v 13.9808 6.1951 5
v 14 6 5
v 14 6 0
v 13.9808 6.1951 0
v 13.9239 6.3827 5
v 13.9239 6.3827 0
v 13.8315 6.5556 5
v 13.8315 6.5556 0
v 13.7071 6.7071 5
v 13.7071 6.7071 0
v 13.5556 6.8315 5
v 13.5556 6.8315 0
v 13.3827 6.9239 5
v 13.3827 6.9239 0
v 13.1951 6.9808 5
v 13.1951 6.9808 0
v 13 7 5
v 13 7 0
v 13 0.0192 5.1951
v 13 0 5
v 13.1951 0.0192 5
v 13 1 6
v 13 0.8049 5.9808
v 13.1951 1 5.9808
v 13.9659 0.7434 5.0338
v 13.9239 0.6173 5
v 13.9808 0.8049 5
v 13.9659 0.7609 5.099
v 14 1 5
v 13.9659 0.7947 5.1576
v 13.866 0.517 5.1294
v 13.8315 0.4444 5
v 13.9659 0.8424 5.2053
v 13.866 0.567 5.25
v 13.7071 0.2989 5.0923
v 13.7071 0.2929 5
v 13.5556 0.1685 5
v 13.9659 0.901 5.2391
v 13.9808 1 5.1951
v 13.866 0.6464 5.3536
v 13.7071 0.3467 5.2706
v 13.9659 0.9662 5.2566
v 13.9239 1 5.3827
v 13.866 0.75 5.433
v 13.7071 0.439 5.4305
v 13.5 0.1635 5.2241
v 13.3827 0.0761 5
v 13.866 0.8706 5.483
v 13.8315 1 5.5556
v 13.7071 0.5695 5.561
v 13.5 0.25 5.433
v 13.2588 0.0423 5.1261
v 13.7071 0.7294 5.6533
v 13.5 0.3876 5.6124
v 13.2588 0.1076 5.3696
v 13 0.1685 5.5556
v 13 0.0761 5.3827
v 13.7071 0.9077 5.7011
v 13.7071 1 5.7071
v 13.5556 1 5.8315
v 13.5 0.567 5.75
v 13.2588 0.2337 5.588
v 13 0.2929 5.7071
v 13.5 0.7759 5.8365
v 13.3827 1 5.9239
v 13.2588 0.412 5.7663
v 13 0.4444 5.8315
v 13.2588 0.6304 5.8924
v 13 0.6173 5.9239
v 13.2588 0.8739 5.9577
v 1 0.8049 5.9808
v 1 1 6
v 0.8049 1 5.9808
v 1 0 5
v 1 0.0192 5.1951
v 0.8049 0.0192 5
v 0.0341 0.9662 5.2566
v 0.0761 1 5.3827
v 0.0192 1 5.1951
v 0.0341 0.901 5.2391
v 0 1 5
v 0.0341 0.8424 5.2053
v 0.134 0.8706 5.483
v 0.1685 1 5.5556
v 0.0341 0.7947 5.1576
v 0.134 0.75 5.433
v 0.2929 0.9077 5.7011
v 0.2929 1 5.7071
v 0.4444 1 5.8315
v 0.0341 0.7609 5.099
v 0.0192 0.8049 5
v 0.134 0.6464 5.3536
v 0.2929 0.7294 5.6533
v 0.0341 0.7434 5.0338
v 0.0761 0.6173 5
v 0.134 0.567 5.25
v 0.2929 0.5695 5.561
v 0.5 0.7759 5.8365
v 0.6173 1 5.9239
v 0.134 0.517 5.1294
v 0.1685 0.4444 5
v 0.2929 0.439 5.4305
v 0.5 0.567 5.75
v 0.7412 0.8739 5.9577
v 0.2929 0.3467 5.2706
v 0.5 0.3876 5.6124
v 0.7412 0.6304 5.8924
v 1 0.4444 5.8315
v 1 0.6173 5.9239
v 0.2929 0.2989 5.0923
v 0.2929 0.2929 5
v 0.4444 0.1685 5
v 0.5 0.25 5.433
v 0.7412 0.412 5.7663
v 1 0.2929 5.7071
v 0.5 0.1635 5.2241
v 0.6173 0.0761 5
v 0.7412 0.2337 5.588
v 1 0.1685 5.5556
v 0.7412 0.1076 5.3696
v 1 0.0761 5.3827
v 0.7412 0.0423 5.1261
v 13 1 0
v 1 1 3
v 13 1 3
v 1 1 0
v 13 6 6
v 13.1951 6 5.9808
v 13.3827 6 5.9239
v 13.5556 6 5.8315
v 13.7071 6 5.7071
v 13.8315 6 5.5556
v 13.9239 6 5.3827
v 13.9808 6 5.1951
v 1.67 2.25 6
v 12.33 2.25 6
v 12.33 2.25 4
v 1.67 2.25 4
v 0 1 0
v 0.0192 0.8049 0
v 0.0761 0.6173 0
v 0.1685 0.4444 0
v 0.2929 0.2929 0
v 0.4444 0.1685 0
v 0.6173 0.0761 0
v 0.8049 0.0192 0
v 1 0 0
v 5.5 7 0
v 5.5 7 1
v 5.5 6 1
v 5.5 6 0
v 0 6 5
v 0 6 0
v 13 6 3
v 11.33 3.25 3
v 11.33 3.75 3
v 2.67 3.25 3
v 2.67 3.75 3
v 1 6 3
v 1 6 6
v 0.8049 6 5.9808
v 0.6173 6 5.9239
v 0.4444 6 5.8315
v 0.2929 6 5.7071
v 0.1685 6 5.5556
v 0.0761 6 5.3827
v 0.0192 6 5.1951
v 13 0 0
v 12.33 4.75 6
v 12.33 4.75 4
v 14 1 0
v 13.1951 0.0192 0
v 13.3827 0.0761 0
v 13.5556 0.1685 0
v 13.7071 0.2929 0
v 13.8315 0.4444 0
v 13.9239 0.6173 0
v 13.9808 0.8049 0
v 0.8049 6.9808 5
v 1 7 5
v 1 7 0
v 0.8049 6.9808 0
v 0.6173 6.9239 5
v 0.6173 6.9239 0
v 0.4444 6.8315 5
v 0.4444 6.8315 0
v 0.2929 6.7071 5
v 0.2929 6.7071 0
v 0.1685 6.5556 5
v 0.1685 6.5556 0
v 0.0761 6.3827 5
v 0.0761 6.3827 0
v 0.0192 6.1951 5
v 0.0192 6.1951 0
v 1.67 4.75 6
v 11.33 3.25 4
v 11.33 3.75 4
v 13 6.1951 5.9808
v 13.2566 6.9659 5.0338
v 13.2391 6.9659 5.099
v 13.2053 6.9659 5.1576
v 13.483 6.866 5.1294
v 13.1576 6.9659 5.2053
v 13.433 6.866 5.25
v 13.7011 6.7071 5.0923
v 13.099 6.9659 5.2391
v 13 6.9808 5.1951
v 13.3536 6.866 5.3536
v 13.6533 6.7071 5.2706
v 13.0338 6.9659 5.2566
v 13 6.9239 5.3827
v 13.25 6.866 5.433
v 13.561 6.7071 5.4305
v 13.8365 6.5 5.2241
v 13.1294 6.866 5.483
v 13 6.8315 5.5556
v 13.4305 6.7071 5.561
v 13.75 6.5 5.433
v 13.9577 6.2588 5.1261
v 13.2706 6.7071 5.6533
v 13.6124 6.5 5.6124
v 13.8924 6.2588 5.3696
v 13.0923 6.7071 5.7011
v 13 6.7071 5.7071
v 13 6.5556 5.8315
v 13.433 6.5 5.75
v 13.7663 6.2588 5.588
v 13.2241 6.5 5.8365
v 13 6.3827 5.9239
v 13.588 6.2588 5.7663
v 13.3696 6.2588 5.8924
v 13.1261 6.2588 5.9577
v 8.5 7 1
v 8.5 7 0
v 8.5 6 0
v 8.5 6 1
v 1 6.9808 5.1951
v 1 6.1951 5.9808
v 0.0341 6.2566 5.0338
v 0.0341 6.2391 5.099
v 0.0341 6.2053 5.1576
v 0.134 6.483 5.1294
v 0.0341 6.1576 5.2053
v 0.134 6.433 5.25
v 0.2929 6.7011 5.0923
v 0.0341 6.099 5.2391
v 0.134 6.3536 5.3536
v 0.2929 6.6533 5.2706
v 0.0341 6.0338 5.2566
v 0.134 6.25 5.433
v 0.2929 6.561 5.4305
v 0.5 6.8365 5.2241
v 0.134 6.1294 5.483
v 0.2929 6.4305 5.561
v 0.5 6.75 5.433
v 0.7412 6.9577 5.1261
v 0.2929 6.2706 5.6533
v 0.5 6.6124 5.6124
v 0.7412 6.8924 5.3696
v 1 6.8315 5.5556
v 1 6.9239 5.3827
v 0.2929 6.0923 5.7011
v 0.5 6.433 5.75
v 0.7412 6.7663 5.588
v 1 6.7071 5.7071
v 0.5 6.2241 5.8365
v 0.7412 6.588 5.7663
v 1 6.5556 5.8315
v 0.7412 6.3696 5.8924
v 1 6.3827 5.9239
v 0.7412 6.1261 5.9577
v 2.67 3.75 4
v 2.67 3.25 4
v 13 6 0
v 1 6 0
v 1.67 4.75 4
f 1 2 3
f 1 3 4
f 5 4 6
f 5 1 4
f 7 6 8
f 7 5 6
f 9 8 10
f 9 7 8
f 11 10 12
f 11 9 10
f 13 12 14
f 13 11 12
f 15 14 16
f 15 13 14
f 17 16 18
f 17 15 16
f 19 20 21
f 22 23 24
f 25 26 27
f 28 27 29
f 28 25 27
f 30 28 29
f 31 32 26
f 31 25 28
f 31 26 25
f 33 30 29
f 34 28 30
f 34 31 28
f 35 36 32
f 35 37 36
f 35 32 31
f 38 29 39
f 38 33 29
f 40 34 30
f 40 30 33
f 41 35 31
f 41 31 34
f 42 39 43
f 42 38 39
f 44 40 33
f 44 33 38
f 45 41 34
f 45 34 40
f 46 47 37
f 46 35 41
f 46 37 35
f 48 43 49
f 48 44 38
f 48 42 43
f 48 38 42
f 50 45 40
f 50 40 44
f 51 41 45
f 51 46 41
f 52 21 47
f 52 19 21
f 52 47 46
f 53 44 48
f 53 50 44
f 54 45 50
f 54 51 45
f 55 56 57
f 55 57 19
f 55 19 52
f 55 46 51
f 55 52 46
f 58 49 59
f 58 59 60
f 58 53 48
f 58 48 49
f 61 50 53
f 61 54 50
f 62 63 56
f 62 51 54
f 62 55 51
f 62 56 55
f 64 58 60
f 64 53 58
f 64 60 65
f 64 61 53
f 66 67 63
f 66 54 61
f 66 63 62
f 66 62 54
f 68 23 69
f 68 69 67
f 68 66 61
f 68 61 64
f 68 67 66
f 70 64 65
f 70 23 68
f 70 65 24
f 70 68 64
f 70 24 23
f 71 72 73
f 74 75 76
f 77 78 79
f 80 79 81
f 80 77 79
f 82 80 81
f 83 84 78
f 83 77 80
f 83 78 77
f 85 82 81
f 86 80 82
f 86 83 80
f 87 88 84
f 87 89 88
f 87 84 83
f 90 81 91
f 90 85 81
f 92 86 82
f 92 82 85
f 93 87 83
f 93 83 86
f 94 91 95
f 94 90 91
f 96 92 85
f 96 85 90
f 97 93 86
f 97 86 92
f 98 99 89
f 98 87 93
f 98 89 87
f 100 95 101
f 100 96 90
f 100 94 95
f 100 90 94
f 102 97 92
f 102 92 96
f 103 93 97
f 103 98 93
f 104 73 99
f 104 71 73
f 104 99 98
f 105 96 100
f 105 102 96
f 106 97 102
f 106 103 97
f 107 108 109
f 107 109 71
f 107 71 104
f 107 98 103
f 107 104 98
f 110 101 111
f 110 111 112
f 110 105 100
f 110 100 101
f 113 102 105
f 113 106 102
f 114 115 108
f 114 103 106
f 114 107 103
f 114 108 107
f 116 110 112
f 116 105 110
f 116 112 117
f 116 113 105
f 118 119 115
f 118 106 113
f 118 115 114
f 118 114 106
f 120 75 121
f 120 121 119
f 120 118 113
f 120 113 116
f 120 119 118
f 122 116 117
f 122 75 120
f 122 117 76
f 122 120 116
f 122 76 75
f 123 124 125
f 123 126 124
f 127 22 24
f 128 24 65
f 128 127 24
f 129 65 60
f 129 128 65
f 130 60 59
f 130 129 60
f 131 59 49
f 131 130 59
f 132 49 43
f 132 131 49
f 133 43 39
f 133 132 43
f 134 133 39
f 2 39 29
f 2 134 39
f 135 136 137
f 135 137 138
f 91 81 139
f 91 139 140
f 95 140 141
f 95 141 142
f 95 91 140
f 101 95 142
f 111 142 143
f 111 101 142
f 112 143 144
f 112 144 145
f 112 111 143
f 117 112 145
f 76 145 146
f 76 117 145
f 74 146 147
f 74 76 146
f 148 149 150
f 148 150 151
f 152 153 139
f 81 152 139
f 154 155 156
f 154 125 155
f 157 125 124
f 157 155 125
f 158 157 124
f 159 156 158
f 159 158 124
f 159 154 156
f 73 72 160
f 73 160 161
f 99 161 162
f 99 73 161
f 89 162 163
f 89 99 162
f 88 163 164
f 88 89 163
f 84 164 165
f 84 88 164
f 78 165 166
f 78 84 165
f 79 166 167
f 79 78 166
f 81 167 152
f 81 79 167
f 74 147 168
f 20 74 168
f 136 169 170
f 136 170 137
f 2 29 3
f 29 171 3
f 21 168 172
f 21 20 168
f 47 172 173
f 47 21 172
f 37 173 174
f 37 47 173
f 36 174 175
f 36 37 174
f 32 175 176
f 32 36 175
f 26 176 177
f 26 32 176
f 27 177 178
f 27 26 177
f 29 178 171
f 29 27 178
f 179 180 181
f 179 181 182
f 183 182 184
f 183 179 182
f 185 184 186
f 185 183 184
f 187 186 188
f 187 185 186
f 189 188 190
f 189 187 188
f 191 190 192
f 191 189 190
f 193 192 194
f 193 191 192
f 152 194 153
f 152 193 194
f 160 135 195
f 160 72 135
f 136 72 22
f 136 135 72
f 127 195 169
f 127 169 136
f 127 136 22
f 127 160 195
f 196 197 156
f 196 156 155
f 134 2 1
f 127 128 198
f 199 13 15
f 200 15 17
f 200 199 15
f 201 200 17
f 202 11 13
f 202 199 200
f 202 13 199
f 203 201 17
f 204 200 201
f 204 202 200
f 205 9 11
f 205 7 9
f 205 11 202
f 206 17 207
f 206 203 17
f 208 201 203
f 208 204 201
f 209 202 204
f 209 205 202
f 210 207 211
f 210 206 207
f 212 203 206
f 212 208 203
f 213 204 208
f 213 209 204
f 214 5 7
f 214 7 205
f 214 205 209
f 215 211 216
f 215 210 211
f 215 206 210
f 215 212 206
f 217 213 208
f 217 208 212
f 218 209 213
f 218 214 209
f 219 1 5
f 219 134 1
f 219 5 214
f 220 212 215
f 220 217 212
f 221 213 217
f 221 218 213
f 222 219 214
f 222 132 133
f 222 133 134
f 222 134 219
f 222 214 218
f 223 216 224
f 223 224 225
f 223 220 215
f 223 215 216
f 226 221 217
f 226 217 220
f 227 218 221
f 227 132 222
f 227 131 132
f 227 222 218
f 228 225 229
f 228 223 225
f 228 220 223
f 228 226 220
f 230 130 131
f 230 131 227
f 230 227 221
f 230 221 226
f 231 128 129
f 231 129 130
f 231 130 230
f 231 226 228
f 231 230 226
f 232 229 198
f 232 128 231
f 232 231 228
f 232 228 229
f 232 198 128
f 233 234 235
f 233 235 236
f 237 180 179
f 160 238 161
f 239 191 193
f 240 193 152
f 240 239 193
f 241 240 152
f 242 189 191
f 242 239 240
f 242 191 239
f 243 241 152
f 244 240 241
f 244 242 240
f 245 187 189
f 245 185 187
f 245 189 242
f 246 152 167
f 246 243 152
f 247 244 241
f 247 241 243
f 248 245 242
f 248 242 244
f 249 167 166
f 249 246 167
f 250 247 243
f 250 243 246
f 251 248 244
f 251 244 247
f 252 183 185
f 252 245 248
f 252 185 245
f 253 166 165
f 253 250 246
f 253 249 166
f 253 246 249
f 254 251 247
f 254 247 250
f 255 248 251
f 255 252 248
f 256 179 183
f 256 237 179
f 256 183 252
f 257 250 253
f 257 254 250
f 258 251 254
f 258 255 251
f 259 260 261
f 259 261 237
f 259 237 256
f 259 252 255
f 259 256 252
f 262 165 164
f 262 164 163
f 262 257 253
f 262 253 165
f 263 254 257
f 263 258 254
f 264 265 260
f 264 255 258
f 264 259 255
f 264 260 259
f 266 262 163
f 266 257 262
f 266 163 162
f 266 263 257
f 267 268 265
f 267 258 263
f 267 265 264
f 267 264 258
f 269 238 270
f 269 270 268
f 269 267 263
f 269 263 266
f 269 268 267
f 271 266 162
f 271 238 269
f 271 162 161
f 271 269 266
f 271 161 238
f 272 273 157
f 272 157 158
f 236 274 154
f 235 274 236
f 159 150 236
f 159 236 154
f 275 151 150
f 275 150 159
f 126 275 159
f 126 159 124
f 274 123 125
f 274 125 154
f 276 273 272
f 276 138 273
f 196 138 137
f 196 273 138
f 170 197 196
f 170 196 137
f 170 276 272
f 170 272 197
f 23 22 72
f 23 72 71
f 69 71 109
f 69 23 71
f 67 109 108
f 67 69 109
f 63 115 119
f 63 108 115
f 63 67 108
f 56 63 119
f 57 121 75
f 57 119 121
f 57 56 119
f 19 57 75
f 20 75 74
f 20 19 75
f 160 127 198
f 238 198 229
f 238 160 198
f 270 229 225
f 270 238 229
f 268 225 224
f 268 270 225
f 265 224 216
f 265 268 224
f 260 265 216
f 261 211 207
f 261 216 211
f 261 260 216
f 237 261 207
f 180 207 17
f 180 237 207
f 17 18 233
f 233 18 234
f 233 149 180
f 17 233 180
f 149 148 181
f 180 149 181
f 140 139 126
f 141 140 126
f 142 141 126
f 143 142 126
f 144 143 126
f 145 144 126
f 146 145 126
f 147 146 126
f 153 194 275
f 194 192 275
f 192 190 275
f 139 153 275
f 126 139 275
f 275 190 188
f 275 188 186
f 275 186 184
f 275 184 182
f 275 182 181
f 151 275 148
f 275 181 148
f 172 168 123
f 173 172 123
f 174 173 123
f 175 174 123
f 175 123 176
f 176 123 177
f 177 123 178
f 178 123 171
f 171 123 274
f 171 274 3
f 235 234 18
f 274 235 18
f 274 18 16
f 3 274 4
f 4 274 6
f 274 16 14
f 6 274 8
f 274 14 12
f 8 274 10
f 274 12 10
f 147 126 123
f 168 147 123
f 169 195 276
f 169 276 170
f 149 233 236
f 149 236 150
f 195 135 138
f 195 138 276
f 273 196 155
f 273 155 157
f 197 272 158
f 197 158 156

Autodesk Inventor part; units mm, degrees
ref_plane "YZ Plane" through (0, 0, 0) normal (1, 0, 0) x (0, 1, 0)
ref_plane "XZ Plane" through (0, 0, 0) normal (0, 1, 0) x (-1, 0, 0)
ref_plane "XY Plane" through (0, 0, 0) normal (0, 0, 1) x (1, 0, 0)
sketch "Sketch1" plane through (0, 0, 0) normal (0, 0, 1) x (1, 0, 0)
  line L0 (0, 0) -> (14, 0)
  line L1 (14, 0) -> (14, 7)
  line L2 (14, 7) -> (0, 7)
  line L3 (0, 7) -> (0, 0)
  dimension "d2" = 14
  dimension "d3" = 7
extrude "Extrusion1" add sketch "Sketch1" along normal blind 6
sketch "Sketch2" plane through (0, 0, 6) normal (0, 0, 1) x (1, 0, 0)
  line L0 (0, 7) -> (14, 0) construction
  line L1 (0, 0) -> (14, 7) construction
  line L2 (1.67, 4.75) -> (12.33, 4.75)
  line L3 (12.33, 4.75) -> (12.33, 2.25)
  line L4 (12.33, 2.25) -> (1.67, 2.25)
  line L5 (1.67, 2.25) -> (1.67, 4.75)
  line L6 (1.67, 4.75) -> (12.33, 2.25) construction
  line L7 (12.33, 4.75) -> (1.67, 2.25) construction
  point P0 (7, 3.5)
  dimension "d4" = 2.5
  dimension "d5" = 10.66
extrude "Extrusion3" cut sketch "Sketch2" against normal blind 2
sketch "Sketch3" plane through (0, 0, 4) normal (0, 0, 1) x (1, 0, 0)
  line L0 (1.67, 4.75) -> (12.33, 4.75) projected
  line L1 (1.67, 2.25) -> (1.67, 4.75) projected
  line L2 (12.33, 2.25) -> (1.67, 2.25) projected
  line L3 (12.33, 4.75) -> (12.33, 2.25) projected
  line L4 (2.67, 3.75) -> (11.33, 3.75)
  line L5 (11.33, 3.75) -> (11.33, 3.25)
  line L6 (11.33, 3.25) -> (2.67, 3.25)
  line L7 (2.67, 3.25) -> (2.67, 3.75)
  point P0 (0, 0)
  dimension "d10" = 1
  dimension "d11" = 1
  dimension "d12" = 1
  dimension "d13" = 1
extrude "Extrusion4" cut sketch "Sketch3" against normal blind 4 contours L4 L5 L6 L7
sketch "Sketch4" plane through (0, 0, 0) normal (0, 0, -1) x (-1, 0, 0)
  line L0 (-2.67, 3.75) -> (-2.67, 3.25) projected
  line L1 (-2.67, 3.25) -> (-11.33, 3.25) projected
  line L2 (-11.33, 3.25) -> (-11.33, 3.75) projected
  line L3 (-11.33, 3.75) -> (-2.67, 3.75) projected
  line L4 (0, 0) -> (-14, 0) projected
  line L5 (0, 7) -> (0, 0) projected
  line L6 (-14, 7) -> (0, 7) projected
  line L7 (-14, 0) -> (-14, 7) projected
  line L8 (-13, 6) -> (-1, 6)
  line L9 (-1, 6) -> (-1, 1)
  line L10 (-1, 1) -> (-13, 1)
  line L11 (-13, 1) -> (-13, 6)
  dimension "d16" = 1
  dimension "d17" = 1
  dimension "d18" = 1
  dimension "d19" = 1
extrude "Extrusion5" cut sketch "Sketch4" against normal blind 3 contours L8 L9 L10 L11
sketch "Sketch5" plane through (0, 7, 0) normal (0, 1, 0) x (1, 0, 0)
  line L0 (14, 0) -> (0, 0) projected
  line L1 (0, 0) -> (0, -6) projected
  line L2 (14, 0) -> (14, -6) projected
  line L3 (5.5, 0) -> (8.5, 0)
  line L4 (8.5, 0) -> (8.5, -1)
  line L5 (8.5, -1) -> (5.5, -1)
  line L6 (5.5, -1) -> (5.5, 0)
  dimension "d22" = 1
  dimension "d23" = 5.5
  dimension "d24" = 5.5
  dimension "d25" = 3
extrude "Extrusion6" cut sketch "Sketch5" against normal blind 1
fillet "Fillet1" radius 1 8 edges at (7, 0, 6) (14, 3.5, 6) (14, 0, 3) (7, 7, 6) (14, 7, 3) (0, 0, 3) (0, 3.5, 6) (0, 7, 3)
properties part number "cover" material "Titanium"
